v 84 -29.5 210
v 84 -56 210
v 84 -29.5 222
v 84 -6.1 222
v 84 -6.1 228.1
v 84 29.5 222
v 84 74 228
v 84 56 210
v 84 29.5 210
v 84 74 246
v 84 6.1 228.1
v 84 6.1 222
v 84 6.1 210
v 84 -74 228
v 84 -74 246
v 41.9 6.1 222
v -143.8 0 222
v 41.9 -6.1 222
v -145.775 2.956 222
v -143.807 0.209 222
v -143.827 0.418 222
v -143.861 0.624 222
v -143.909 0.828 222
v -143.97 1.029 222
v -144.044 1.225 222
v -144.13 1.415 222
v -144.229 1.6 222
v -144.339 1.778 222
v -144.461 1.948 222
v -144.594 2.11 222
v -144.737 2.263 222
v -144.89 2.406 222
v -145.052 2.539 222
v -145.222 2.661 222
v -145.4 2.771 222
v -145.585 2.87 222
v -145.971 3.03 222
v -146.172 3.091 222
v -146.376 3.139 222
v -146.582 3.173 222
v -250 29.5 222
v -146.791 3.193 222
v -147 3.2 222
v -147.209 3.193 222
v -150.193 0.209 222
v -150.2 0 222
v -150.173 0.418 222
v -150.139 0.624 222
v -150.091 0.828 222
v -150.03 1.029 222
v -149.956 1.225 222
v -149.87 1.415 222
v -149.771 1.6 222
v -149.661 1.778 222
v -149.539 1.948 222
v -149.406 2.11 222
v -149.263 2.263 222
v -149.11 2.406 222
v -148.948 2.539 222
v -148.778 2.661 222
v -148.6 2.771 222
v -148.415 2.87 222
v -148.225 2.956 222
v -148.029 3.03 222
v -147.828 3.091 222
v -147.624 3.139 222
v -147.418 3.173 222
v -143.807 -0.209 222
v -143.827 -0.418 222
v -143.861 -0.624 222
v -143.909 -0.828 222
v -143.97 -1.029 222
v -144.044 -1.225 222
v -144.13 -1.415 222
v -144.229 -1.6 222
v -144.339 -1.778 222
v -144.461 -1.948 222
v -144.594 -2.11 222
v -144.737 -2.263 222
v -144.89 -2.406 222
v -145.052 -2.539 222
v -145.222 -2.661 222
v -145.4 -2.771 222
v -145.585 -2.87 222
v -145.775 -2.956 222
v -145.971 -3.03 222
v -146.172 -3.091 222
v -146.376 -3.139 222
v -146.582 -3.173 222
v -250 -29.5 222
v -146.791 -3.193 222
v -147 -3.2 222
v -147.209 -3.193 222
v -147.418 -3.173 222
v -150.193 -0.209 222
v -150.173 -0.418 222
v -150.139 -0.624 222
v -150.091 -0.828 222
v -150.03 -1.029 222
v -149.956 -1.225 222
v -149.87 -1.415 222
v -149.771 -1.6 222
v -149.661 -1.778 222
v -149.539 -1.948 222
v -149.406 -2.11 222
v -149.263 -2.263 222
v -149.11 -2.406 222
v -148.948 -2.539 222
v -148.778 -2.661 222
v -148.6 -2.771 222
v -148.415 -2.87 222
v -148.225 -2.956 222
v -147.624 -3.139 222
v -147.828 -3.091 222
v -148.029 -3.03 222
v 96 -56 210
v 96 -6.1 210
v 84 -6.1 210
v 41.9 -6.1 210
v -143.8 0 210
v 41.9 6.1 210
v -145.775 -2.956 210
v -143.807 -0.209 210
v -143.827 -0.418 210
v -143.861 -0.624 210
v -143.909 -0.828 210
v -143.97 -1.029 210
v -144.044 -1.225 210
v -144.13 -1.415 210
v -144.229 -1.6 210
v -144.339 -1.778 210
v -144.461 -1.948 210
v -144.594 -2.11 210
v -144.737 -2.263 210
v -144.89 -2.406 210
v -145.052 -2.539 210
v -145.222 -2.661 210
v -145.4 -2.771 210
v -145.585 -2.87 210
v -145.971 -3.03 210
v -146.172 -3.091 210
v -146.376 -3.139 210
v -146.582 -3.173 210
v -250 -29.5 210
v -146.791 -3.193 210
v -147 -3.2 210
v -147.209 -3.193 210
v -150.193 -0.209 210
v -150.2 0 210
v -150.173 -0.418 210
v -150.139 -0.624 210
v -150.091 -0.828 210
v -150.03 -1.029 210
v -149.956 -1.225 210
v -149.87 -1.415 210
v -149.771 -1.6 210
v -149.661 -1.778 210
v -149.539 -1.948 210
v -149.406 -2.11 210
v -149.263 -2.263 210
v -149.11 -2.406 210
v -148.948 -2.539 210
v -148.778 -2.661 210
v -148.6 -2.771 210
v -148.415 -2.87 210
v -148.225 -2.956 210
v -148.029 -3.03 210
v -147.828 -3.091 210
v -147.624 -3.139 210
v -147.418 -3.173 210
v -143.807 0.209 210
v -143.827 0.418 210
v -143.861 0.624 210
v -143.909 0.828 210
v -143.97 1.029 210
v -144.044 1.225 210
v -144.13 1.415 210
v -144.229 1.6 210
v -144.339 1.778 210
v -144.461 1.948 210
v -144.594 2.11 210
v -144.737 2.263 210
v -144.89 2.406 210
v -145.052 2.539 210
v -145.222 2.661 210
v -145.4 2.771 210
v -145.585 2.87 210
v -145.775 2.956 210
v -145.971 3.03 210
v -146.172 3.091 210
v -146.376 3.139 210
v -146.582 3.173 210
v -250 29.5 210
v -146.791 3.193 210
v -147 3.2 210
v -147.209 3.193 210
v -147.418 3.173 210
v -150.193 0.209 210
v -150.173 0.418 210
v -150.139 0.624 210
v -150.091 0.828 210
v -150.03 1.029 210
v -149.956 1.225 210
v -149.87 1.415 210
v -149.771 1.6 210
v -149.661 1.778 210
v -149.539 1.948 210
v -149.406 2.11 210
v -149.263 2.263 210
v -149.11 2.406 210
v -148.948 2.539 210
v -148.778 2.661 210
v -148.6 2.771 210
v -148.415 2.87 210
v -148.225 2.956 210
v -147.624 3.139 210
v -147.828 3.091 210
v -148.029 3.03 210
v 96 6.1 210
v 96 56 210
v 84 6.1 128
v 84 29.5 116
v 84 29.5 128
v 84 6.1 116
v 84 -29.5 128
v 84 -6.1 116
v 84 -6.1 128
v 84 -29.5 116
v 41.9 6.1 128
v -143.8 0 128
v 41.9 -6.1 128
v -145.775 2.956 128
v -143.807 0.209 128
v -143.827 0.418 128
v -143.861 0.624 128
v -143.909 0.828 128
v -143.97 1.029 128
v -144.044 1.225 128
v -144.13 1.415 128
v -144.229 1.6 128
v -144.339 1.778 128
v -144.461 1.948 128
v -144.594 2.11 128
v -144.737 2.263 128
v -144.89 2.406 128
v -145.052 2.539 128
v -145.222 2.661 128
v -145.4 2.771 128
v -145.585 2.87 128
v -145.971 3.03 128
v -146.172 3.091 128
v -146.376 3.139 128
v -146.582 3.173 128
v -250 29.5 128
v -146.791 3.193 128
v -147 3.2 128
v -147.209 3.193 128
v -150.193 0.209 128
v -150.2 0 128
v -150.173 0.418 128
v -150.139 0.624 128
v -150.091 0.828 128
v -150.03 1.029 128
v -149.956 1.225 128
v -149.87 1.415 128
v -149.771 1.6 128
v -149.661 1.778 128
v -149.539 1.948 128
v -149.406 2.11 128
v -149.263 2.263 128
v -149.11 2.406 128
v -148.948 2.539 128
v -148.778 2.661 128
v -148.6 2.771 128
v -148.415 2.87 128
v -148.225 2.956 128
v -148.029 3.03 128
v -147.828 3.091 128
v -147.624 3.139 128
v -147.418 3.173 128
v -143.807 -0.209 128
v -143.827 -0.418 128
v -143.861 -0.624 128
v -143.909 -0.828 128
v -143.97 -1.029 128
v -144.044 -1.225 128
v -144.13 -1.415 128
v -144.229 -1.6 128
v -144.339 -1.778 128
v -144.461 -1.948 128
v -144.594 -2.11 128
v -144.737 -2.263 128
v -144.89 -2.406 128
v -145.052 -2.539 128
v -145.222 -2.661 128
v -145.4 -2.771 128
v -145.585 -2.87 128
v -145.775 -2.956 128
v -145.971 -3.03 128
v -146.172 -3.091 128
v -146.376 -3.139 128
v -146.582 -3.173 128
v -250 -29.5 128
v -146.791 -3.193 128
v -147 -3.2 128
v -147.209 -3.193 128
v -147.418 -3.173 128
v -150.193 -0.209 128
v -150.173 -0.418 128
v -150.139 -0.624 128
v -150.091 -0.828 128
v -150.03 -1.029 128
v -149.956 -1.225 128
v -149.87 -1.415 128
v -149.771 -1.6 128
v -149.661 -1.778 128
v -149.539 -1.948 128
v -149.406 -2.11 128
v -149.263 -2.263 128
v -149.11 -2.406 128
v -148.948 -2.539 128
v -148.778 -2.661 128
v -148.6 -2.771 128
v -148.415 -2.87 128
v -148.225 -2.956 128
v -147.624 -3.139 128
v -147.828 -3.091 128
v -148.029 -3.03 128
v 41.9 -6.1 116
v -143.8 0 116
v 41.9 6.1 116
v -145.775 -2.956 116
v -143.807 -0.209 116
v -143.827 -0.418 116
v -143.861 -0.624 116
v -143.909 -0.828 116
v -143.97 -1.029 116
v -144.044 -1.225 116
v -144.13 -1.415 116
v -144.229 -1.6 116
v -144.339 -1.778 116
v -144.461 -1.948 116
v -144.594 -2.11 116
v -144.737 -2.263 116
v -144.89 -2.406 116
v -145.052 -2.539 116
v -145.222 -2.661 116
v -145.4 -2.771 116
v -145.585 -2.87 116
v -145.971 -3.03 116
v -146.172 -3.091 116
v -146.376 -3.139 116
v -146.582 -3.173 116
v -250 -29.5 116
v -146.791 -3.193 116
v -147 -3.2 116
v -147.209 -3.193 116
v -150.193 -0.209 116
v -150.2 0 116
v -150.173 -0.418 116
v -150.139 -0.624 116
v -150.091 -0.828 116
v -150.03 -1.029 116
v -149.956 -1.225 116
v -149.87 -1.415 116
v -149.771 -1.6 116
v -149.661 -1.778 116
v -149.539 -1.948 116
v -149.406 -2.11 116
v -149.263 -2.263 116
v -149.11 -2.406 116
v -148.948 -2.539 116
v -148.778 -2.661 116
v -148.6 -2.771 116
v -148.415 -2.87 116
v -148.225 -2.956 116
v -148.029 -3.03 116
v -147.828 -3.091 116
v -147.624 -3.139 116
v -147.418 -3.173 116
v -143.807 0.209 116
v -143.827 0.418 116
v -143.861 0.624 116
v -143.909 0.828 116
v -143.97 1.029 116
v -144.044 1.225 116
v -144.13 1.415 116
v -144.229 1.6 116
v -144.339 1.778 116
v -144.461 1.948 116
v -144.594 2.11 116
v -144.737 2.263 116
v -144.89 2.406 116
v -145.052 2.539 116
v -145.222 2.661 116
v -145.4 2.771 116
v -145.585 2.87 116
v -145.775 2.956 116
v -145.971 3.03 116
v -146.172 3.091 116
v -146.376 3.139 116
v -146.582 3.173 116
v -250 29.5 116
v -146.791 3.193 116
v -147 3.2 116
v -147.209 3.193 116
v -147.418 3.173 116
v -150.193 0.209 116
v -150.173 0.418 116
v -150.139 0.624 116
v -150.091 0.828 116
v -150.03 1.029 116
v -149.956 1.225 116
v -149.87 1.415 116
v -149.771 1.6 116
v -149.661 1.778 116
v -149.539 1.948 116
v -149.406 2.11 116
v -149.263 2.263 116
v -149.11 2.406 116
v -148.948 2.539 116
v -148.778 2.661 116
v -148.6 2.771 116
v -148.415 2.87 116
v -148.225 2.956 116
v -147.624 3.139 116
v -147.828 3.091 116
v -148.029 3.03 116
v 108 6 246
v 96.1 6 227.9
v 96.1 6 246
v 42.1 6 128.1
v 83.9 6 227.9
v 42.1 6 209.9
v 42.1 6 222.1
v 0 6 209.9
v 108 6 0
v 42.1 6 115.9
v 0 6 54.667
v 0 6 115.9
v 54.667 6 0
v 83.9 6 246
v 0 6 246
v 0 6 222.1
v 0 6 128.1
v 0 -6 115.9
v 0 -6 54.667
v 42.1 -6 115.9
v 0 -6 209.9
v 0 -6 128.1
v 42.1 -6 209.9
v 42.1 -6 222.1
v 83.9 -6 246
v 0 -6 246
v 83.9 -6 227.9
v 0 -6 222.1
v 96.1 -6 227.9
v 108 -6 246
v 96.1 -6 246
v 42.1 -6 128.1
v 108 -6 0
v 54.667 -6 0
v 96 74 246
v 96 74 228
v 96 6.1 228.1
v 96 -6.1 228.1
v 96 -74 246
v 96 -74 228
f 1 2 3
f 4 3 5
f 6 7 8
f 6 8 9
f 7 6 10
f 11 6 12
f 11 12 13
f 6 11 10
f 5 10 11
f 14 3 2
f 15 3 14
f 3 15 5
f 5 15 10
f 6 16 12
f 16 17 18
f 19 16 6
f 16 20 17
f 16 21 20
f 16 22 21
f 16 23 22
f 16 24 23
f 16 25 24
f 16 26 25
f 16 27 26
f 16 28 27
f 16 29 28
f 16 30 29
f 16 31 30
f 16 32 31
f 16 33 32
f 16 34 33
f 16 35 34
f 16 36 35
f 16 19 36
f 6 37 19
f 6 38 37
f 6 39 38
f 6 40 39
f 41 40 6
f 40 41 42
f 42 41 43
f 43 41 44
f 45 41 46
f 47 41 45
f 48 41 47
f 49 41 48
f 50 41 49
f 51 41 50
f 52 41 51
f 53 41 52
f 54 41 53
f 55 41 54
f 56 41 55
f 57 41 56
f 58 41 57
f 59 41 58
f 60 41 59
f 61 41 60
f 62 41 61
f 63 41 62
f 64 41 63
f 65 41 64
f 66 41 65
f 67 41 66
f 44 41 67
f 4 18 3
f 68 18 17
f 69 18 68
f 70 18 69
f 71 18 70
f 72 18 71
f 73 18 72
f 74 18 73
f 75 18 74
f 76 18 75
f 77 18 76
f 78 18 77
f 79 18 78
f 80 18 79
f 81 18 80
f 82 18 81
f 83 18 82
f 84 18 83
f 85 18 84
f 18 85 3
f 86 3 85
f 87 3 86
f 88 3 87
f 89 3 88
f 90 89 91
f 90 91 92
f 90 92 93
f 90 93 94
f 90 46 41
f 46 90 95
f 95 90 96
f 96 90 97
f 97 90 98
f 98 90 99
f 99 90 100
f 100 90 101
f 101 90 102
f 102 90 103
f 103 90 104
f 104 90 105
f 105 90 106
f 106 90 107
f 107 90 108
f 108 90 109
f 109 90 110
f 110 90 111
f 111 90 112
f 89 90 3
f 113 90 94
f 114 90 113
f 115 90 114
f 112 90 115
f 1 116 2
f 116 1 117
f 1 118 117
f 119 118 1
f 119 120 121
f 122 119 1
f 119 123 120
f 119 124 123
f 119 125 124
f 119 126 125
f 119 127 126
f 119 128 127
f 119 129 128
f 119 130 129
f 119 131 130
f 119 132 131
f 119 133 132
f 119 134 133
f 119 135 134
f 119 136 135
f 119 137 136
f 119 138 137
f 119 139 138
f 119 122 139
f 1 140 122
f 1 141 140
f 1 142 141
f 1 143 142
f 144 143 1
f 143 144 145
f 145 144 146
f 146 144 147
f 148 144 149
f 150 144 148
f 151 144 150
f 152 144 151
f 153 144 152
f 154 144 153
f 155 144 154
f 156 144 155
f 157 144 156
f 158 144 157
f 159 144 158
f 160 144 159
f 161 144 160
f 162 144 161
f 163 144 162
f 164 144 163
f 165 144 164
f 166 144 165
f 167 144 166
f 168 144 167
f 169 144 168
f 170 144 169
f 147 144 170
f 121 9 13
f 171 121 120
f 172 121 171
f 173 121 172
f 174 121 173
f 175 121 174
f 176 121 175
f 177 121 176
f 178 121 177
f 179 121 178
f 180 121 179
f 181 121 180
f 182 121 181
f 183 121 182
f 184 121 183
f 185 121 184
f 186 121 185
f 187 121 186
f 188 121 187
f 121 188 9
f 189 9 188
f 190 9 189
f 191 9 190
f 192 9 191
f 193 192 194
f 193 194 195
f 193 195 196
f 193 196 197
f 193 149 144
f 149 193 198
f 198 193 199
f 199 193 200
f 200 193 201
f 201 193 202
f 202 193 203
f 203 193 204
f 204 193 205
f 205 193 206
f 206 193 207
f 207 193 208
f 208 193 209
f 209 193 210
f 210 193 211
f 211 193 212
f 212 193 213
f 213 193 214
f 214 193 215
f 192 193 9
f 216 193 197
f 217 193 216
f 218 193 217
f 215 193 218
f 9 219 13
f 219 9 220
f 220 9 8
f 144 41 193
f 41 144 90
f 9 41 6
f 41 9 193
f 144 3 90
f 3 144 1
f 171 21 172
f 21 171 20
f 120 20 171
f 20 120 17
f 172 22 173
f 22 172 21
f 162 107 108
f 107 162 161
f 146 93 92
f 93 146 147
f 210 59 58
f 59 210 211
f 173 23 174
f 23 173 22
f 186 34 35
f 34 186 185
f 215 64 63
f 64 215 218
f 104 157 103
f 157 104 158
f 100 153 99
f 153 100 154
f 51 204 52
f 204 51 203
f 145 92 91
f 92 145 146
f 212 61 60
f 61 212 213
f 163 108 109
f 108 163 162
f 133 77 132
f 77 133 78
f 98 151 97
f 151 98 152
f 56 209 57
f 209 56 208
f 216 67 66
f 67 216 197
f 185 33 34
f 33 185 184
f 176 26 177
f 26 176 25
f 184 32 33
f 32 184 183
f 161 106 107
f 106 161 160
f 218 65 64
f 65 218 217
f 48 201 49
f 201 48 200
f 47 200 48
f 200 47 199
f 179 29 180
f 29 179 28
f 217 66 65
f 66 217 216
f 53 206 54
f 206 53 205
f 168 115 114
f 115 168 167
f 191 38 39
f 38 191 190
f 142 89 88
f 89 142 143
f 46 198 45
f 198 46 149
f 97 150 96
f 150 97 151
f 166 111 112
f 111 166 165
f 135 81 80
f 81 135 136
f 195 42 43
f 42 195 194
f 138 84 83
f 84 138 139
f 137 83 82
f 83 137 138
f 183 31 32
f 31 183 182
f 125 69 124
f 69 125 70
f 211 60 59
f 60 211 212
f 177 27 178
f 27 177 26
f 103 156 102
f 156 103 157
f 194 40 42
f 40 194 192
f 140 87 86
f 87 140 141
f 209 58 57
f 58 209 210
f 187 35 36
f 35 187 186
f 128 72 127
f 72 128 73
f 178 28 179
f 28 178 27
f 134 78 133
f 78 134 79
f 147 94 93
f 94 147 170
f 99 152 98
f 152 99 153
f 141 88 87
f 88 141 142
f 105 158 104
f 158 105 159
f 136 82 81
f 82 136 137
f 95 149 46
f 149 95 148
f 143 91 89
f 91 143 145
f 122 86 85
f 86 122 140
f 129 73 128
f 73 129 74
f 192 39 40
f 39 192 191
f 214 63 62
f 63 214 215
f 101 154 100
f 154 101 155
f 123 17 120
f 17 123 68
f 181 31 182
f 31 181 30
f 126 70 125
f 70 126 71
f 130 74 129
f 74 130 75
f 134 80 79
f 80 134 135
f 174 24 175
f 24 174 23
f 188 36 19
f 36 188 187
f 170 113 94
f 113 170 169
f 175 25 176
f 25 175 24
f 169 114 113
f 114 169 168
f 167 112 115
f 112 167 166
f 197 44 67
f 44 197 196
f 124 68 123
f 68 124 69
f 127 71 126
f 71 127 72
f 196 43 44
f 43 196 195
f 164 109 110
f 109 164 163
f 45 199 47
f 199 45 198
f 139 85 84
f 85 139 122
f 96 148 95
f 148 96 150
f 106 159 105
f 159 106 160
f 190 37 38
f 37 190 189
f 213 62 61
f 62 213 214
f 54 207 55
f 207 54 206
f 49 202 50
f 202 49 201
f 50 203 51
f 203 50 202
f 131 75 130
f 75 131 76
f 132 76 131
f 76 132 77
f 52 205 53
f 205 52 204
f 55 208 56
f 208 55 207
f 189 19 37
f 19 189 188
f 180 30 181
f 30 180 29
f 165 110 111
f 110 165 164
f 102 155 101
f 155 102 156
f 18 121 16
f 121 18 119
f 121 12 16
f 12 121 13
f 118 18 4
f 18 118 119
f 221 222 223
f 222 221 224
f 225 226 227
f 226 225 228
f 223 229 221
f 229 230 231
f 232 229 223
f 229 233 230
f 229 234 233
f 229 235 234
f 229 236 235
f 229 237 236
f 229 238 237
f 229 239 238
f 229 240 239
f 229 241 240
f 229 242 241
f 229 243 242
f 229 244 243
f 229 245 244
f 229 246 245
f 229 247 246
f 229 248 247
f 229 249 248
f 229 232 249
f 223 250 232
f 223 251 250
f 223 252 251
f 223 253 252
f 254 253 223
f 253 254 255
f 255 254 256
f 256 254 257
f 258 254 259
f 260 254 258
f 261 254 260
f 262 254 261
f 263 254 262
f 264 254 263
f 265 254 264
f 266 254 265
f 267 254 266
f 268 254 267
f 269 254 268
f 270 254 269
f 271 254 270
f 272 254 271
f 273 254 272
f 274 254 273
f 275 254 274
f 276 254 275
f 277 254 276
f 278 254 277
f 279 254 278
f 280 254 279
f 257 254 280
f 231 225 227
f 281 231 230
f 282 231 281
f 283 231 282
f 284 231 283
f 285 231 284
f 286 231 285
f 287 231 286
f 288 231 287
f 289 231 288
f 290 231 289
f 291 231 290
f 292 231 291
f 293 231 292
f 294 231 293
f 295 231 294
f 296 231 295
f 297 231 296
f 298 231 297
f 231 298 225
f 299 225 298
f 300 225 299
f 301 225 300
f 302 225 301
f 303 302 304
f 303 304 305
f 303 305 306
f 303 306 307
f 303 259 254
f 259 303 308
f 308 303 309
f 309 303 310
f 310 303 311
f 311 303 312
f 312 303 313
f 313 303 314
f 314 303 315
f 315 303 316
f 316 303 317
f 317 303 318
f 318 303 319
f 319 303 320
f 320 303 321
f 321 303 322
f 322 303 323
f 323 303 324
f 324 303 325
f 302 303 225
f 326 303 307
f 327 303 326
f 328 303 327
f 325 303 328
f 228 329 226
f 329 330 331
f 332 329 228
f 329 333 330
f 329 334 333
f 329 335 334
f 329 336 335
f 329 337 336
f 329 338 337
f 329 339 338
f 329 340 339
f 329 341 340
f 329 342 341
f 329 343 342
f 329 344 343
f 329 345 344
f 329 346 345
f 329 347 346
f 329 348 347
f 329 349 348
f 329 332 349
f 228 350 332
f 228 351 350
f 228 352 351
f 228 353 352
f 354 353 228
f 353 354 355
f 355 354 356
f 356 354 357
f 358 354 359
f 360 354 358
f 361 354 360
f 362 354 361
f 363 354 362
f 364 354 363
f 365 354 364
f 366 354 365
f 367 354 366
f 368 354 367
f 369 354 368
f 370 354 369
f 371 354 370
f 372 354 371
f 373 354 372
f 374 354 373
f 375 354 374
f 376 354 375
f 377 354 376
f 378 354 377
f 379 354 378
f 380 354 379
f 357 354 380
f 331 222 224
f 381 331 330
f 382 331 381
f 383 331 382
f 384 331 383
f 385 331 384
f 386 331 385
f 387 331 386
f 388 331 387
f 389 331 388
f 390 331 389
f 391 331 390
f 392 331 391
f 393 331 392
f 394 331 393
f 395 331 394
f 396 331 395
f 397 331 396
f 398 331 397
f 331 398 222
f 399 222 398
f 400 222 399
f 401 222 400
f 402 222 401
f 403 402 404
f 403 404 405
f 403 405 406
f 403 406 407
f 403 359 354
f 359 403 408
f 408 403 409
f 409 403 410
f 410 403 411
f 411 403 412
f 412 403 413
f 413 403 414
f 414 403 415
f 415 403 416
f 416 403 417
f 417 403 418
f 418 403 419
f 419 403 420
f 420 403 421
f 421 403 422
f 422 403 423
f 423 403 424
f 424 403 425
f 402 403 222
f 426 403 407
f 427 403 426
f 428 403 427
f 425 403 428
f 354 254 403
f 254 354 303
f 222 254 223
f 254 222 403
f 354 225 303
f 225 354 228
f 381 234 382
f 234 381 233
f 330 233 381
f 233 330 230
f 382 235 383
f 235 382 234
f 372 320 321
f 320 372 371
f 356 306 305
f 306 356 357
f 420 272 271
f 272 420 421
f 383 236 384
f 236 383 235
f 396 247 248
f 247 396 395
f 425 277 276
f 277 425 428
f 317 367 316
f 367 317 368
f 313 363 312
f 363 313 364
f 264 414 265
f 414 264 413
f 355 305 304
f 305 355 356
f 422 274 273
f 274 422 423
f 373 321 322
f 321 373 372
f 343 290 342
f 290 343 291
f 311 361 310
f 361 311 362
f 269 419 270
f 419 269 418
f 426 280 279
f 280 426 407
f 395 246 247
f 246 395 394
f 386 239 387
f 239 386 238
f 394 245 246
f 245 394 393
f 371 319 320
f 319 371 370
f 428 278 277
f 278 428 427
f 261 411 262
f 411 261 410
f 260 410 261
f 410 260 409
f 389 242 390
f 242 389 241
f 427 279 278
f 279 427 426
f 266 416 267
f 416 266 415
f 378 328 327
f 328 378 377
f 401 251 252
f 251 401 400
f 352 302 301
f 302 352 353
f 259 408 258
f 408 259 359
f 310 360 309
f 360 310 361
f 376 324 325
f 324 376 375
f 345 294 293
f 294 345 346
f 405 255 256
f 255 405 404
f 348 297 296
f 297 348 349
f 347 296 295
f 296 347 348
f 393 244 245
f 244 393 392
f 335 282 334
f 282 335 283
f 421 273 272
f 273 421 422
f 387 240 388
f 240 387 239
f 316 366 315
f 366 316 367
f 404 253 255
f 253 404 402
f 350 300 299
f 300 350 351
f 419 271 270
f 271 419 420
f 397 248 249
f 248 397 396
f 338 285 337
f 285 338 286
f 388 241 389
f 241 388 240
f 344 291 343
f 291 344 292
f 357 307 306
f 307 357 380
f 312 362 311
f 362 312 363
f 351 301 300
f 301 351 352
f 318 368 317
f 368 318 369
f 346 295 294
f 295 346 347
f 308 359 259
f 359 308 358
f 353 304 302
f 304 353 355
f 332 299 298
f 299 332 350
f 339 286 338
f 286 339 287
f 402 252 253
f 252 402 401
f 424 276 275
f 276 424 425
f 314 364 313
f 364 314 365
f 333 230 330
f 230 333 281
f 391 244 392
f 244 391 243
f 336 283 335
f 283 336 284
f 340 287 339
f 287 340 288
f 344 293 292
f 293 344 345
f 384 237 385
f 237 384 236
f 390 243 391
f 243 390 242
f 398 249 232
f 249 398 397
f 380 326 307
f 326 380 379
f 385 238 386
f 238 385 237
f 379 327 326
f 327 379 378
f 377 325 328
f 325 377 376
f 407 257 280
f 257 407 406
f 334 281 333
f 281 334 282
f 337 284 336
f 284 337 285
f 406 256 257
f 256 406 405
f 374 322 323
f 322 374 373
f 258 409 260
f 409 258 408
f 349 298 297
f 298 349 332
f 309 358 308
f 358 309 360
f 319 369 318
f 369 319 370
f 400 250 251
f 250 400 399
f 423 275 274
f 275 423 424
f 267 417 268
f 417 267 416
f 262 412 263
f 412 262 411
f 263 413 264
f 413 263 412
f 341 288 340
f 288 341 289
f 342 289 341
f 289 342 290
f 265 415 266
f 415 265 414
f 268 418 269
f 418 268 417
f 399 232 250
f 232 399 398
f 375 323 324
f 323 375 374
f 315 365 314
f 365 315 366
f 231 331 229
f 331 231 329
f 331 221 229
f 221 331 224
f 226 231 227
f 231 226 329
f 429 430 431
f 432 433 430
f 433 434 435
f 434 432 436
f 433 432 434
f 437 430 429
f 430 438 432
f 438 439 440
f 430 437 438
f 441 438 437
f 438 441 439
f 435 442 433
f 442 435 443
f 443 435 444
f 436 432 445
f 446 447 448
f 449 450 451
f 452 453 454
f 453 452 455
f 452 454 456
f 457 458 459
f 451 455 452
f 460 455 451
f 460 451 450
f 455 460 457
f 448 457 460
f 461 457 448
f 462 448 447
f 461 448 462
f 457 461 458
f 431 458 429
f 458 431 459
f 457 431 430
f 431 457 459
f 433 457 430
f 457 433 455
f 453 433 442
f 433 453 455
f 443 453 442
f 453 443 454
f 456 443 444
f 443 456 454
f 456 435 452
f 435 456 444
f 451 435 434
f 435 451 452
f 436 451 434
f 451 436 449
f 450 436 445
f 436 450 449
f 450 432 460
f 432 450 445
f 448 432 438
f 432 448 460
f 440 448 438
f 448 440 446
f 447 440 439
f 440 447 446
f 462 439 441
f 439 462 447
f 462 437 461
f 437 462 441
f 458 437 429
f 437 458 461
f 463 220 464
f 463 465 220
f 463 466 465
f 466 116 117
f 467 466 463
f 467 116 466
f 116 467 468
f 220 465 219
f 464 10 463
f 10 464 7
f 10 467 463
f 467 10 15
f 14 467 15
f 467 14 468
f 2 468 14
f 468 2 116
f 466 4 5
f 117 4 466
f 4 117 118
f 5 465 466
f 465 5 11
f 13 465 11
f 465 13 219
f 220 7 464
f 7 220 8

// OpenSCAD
// ==========================================================================
//  GENERATED FILE -- DO NOT EDIT.
//  Produced by build/build.py from components/Turtle_Rear_Fin_v1.scad
//  Turtle Body version 1.8.1
//  Edit lib/ and src/ instead, then run: python3 build/build.py
// ==========================================================================
/*
 Hope Turtle rear fin. Units: mm. License: CERN-OHL-S-2.0.
 Four wooden pieces: yellow fin, two green bottle-holder shafts, red solar
 crossbar. Panel + bottle are F5 reference only, excluded from F6/STL.
 Shaft length 334. Slot openings 12.2 mm (0.2 mm TOTAL, centred).
 TB-07: green-slat mounting hole is 103 mm from the shaft front, matching
 the assembled Turtle (was a fixed 50 mm).

 SOURCE FILE — geometry lives in lib/rear_fin.scad + lib/params.scad.
 The committed self-contained file is generated by build/build.py.
*/

/* [Fit and tuning] */
half_lap_clearance   = 0.2; // TOTAL extra slot width, centred on the board
solar_slot_clearance = 0.2;
exploded = 0;

/* [Display] */
part = "assembly"; // [assembly,fin,solar_holder,shaft]
show_solar_panel = true;   // F5 reference only, excluded from F6/STL
show_bottle_mockup = false; // reserved

/* [Render] */
fn = 96;

// [bundle] begin use <../../lib/rear_fin.scad>
// ==========================================================================
//  Turtle Body -- rear fin + solar-panel support  (lib module)
// --------------------------------------------------------------------------
//  One yellow vertical fin, two green bottle-holder shafts, one red solar
//  crossbar. In the standalone the panel + bottle are %-reference only and
//  excluded from F6/STL. See CLAUDE.md s11.
//
//  Shaft length keeps the approved formula 305 + (2/3)(93-24) - 17 = 334.
//  Half-lap and solar-joint clearances are 0.2 mm TOTAL, centred on the
//  12 mm board (slot opening 12.2 mm, not 12.4). TB-07: the green-slat
//  mounting hole is p_rear_shaft_hole_from_front() (103 mm at defaults),
//  matching the assembled Turtle -- not the old fixed 50 mm.
//
//  Definitions only. Geometry is emitted by rear_fin_assembly() or the
//  individual part modules.
// ==========================================================================

// [bundle] begin use <params.scad>
// ==========================================================================
//  Turtle Body -- shared dimension contract
// --------------------------------------------------------------------------
//  The single source of truth for every dimension that more than one
//  subsystem depends on. Values are exposed as zero-argument functions so
//  this file can be pulled in with `use <params.scad>` (which ignores
//  top-level variable assignments) without polluting any namespace.
//
//  lib/ modules take these as DEFAULT argument values:
//      module control_cap(roof_t = p_cap_roof_t(), ...) { ... }
//  so a src/ wrapper can still override one value from its customizer block
//  while every other subsystem keeps the shared number.
//
//  Rules:
//   * one function per concept, canonical name (see CLAUDE.md cross-file table)
//   * derived values are functions of other p_*() functions, never re-typed
//   * mm throughout; names say _d (diameter), _r (radius), _t (thickness),
//     _len / _h (axial), _af (hex across-flats)
//   * do NOT add a bare `x = ...;` here -- bundle.py / lint.py will reject it
// ==========================================================================

// ---- tolerances and render quality --------------------------------------
function p_eps()          = 0.02;   // Boolean overlap / cut-through fudge
function p_fit_clearance() = 0.2;   // wood joint: TOTAL extra slot width, centred on the board
function p_fn_plastic()   = 120;    // printed PLA parts (cap, cage, axle, mold)
function p_fn_wood()      = 96;     // cut wooden parts
function p_fn_curve()     = 180;    // fine profile curves (bottle, sails)

// ---- bottle (the foundation reference) ---------------------------------
function p_bottle_d()        = 82;    // outside diameter
function p_bottle_h()        = 305;   // total height incl. ordinary screw cap
function p_bottle_wall_t()   = 0.5;   // modelling assumption, not a measurement
function p_bottle_cap_d()    = 31;    // ordinary screw cap (NOT the control-cap disk)
function p_bottle_cap_h()    = 17;    // ordinary screw cap height (rear-fin / ballast formulas)
function p_collar_d()        = 34;    // bottle collar, independent of cap diameter
function p_top_dome_h()      = 62;
function p_bottom_dome_h()   = 25;
function p_dome_power()      = 2.5;   // superellipse exponent
function p_bottle_neck_h()   = 5;
function p_bottle_collar_h() = 1;
function p_bottle_neck_d()   = p_bottle_cap_d() - 3;   // 28: neck is 3 mm under the cap
function p_bottle_base_ratio() = 0.88; // slightly narrower footprint at the base
function p_bottle_profile_steps() = 16;
// cut bottle (control head): the lower dome is removed and a short socket is
// bored so the control-cap insert slides in. Cut plane sits 5 mm above the
// bottom dome height.
function p_bottle_cut_extra()  = 5;
function p_bottle_cut_height() = p_bottom_dome_h() + p_bottle_cut_extra();   // 30

// nominal bottle interior and the cap insert that enters it
function p_bottle_socket_d() = p_bottle_d() - 2 * p_bottle_wall_t();          // 81
function p_insert_shaft_radial_clearance() = 1;
function p_insert_shaft_d()  = p_bottle_socket_d()
                             - 2 * p_insert_shaft_radial_clearance();          // 79

// ---- wooden stock -----------------------------------------------------
function p_wood_t()          = 12;    // shared board / slat thickness
function p_fin_board_w()     = 93;    // shared fin-system stock width
function p_screw_side_offset() = 25;  // mounting-hole inset from a John end

// ---- Ecojoiner port --------------------------------------------------
// A port must swallow the bottle's tapered top (the top dome) plus a seating
// allowance, so its axial length is DERIVED from the bottle, not fixed. This
// is the same rule the HopeTurtles.org generators use
// (port_length = taper_height + port_allowance); until 2026-09-08 lib carried
// the evaluated constant 82 instead, which silently broke the rule for any
// bottle other than the reference one. Ballast and Ecojoiner both read it.
function p_port_allowance()  = 20;                 // seating allowance beyond the dome
function p_port_length()     = p_top_dome_h() + p_port_allowance();   // 62 + 20 = 82
function p_port_height()     = p_bottle_d();       // opening height == bottle diameter (asserted)

// ---- M6 hardware ---------------------------------------------------
function p_m6_clearance_d()  = 6.4;   // M6 clearance hole
function p_m6_bolt_shaft_d() = 6;     // visual placeholder only
function p_m6_bolt_head_d()  = 12;
function p_m6_bolt_head_t()  = 4;

// ---- control cap (large stationary disk; see CLAUDE.md s7) ----------
//  TB-03 resolution: repository 5 mm roof / 2 mm boss is authoritative;
//  the axle (below) is derived to this datum.
function p_cap_disk_d()      = 100;   // control-cap disk (independent of p_bottle_cap_d)
function p_cap_roof_t()      = 5;     // disk / roof thickness
function p_cap_boss_depth()  = 2;     // extra projection of the centre boss into the hollow cap
function p_cap_boss_d()      = 18;
function p_cap_insert_len()  = 35;    // straight insert shaft length
function p_cap_insert_wall_t() = 4;
function p_cap_entry_chamfer_h()     = 1;
function p_cap_entry_chamfer_delta() = 1;
function p_cap_axle_bore_d() = 8.6;   // 0.3 mm radial clearance to the Ø8 shaft
function p_cap_cage_radial_clearance() = 1;   // cap disk -> cage inner wall (radial)
function p_cap_total_h()     = p_cap_roof_t() + p_cap_insert_len();           // 40
function p_cap_bearing_len() = p_cap_roof_t() + p_cap_boss_depth();           // 7

// buttons (through both cap and cage)
function p_button_upper_d()  = 17;    // clearance hole in the cap
function p_button_axis()     = "y";   // "x" or "y"
function p_button_radius()   = 24;    // radial position of the two button centres (48 mm apart)

// ---- silicone seal grooves + rings (CLAUDE.md s8) ------------------
function p_seal_groove_count()      = 2;
function p_seal_groove_axial_h()    = 2;   // groove height
function p_seal_groove_radial_depth() = 2; // groove depth
function p_seal_groove1_from_shoulder() = 12;  // groove centre, measured from the insert SHOULDER
function p_seal_groove2_from_shoulder() = 25;
function p_seal_ring_axial_t()      = 1.5;  // cast ring thickness
function p_seal_ring_radial_w()     = 5;    // NOT validated; 3.5 was a suggested milder prototype
function p_seal_groove_root_d() = p_insert_shaft_d()
                                - 2 * p_seal_groove_radial_depth();            // 75

// ---- round / hex centre axle (CLAUDE.md s9) -----------------------
//  Derived to the 5/2 cap datum (TB-03/TB-04). round_inside_cap is measured
//  from the roof underside and INCLUDES the boss -- do not add the boss again.
function p_axle_round_d()        = 8;
function p_axle_round_ext()      = 1;    // projection above the cap's outer face
function p_axle_round_inside_cap() = p_cap_insert_len() - 5;  // 30: roof underside to round end (incl. boss)
function p_axle_round_len()      = p_axle_round_inside_cap() + p_cap_roof_t() + p_axle_round_ext();  // 36
function p_axle_hex_af()         = 10.0; // shaft across-flats (0.3 mm to the Ø10.3 cage bore)
function p_axle_hex_len()        = 23;
function p_axle_join_overlap()   = 0.2;  // hex<->round Boolean overlap
function p_axle_total_len()      = p_axle_hex_len() + p_axle_round_len();
function p_axle_hex_corner_d()   = p_axle_hex_af() / cos(30);                  // ~11.55
function p_magnet_d()            = 3;    // AS5600 sensing magnet recess
function p_magnet_t()            = 1;

// ---- axle rotary shaft O-ring (waterproofs the axle bore; cast in the mold) ----
//  A round-section O-ring seated in a gland in the control-cap bore, sealing
//  against the spinning round section of the axle. ID is tied to the shaft.
function p_axle_oring_cs()     = 2.0;                                   // cross-section
function p_axle_oring_id()     = p_axle_round_d();                      // 8 -- hugs the shaft
function p_axle_oring_od()     = p_axle_oring_id() + 2 * p_axle_oring_cs();          // 12
function p_axle_oring_mean_r() = (p_axle_oring_id() + p_axle_oring_cs()) / 2;        // 5
//  gland cut into the cap bore for it
function p_cap_oring_squeeze()      = 0.25;  // radial squeeze on the seal
function p_cap_oring_gland_od()     = p_axle_oring_od() - 2 * p_cap_oring_squeeze(); // 11.5
function p_cap_oring_gland_w()      = 1.3 * p_axle_oring_cs();                       // 2.6 axial
function p_cap_oring_gland_from_face() = 3.5; // gland centre, from the cap outer face, along the bore

// ---- rotating control cage (CLAUDE.md s6) ------------------------
function p_cage_wall_t()     = 6.5;   // radial wall thickness
function p_cage_roof_t()     = 6;     // roof / surface plate thickness
function p_cage_inner_d()    = p_cap_disk_d() + 2 * p_cap_cage_radial_clearance();   // 102
function p_cage_outer_d()    = p_cage_inner_d() + 2 * p_cage_wall_t();               // 115
function p_cage_skirt_depth()   = 44;   // roof underside to the ORIGINAL skirt rim
function p_cage_peak_extension() = 20;  // crest extends this far past the original rim
function p_cage_valley_wall_h()  = 10;  // minimum wall depth between mounts
function p_cage_total_h()    = p_cage_skirt_depth() + p_cage_roof_t();              // 50 (native)
function p_cage_notch_count()   = 4;
function p_cage_notch_w()    = 22.5;  // batten groove width
function p_cage_notch_depth() = 3.7;
function p_cage_wave_segments() = 240;
function p_cage_hub_d()      = 29;
function p_cage_pocket_d()   = 26;    // top clip pocket
function p_cage_pocket_depth() = 4;
function p_cage_hex_bore_af() = 10.3; // central hex bore (0.3 mm to the Ø10.0 shaft)
function p_cage_bearing_d()  = 9;     // hemispherical bearing bump
function p_cage_bearing_count() = 8;
function p_cage_bearing_pcd() = p_cap_disk_d() - p_cage_bearing_d() + 0.5;          // 91.5
function p_cage_top_hole_d() = 18;    // central button / access hole through the roof
function p_cage_mount_hole_d() = 3.2; // two M3 clearance holes per batten / groove
function p_cage_mount_pitch()  = 32;  // vertical pitch of the pair
function p_cage_lower_hole_from_tip() = 10;
// 45-deg outward chamfer on the roof-top outer edge (0 = sharp). The cage
// prints roof-face-down, so this bevel flares OUT from the bed and stays
// printable; it is masked away around each batten groove. See lib/control_cage.scad.
function p_cage_roof_bevel() = 4;

// ---- sail apparatus (CLAUDE.md s10) ---------------------------
function p_side_batten_h()   = 205;
function p_side_batten_w()   = 20;
function p_side_batten_radial_t() = 10;
function p_top_crossbar_len() = 6 * p_bottle_d();   // 492
function p_top_crossbar_w()  = 22;
function p_top_crossbar_t()  = p_wood_t();          // 12
function p_sail_bar_axle_hole_d() = 12;             // Ø12; fits the ~11.55 hex corner dia
function p_bottom_rail_len() = 3 * p_bottle_d();    // 246
function p_bottom_rail_bottle_clearance() = 1;
function p_sail_rail_color()  = [0.56, 0.39, 0.39]; // brown (top AND bottom rails)
function p_c_piece_color()    = [1.0, 0.52, 0.20];  // orange, retained

// ---- rear fin + solar support (CLAUDE.md s11) ----------------
function p_solar_panel_w() = 148;
function p_solar_panel_h() = 223;
function p_solar_panel_t() = 2.5;    // real panel, independent of wood thickness
function p_rear_shaft_len() = p_bottle_h()
                            + (2/3) * (p_fin_board_w() - 2 * p_wood_t())
                            - p_bottle_cap_h();                                 // 334
function p_rear_half_lap_engagement() = 42;   // green/yellow interlock depth
function p_rear_fin_tab_width() = 15;
function p_rear_shaft_width()   = 59;
// TB-07: the green-slat mounting hole follows the mating Ecojoiner John, not a
// fixed 50 mm. Derived from the install transform; the john_length/2 terms
// cancel, leaving a pure function of the shared contract (= 103 at defaults).
function p_rear_shaft_hole_from_front() =
    p_rear_shaft_len() - p_screw_side_offset() - p_bottle_h()
    + p_bottle_cap_h() + p_port_height();

// ---- ballast attachment (CLAUDE.md s12) ---------------------
function p_ballast_core_w()   = p_bottle_d() - 2 * p_wood_t();                  // 58
function p_ballast_core_len() = p_bottle_h() - p_bottle_cap_h() + 6 * p_wood_t();  // 360
function p_ballast_slat_gap() = p_bottle_d();          // clear inner-face gap
function p_ballast_slat_spacing() = p_bottle_d() + p_wood_t();                  // 94
function p_ballast_board_len() = 3.5 * p_bottle_d();   // 287
function p_ballast_fin_len()   = 3 * p_bottle_d();     // 246
function p_ballast_lock_w()    = 5 * p_wood_t();       // 60
// [bundle] end   <params.scad>

function rf_t()             = p_wood_t();
function rf_fin_width()     = p_fin_board_w() + p_rear_fin_tab_width();          // 108
function rf_fin_height()    = 3 * p_bottle_d();                                  // 246
function rf_diag()          = (2/3) * p_bottle_d();                              // 54.667
function rf_shaft_length()  = p_rear_shaft_len();                               // 334
function rf_shaft_width()   = p_rear_shaft_width();                             // 59
function rf_solar_holder_len() = p_solar_panel_w();                            // 148
function rf_solar_holder_h()   = 3 * rf_t();                                    // 36
function rf_solar_chamfer()    = 1.5 * rf_t();                                  // 18
function rf_solar_slot_depth() = rf_solar_holder_h() / 2;                       // 18
function rf_solar_notch_x0()   = rf_fin_width() - 2 * rf_t();                    // 84
function rf_shaft_rear_x()     = rf_solar_notch_x0();                            // 84
function rf_shaft_front_x()    = rf_shaft_rear_x() - rf_shaft_length();
function rf_joint_meet_x()     = rf_shaft_rear_x() / 2;
function rf_upper_shaft_z0()   = rf_fin_height() - 3 * rf_t();
function rf_lower_shaft_z0()   = rf_upper_shaft_z0() - p_bottle_d() - rf_t();
function rf_solar_meet_z()     = rf_upper_shaft_z0() + rf_solar_slot_depth();

module rf_assert_valid(half_lap, solar_clear, hole_from_front, hole_d) {
    t = rf_t();
    assert(t > 0 && p_bottle_h() > p_bottle_cap_h() && p_bottle_cap_d() > 0);
    assert(p_bottle_d() > 0 && p_fin_board_w() > 2 * t && p_rear_fin_tab_width() > 0);
    assert(p_solar_panel_w() > 0 && p_solar_panel_h() > 0 && p_solar_panel_t() > 0);
    assert(half_lap >= 0 && solar_clear >= 0);
    assert(rf_shaft_front_x() < 0 && rf_joint_meet_x() > half_lap / 2);
    assert(rf_shaft_width() > t + half_lap);
    assert(half_lap < t && half_lap < p_bottle_d());
    assert(rf_lower_shaft_z0() - half_lap / 2 >= rf_diag(),
           "rear_fin: lower joint intersects the diagonal fin edge.");
    assert(rf_fin_width() > rf_diag());
    assert(solar_clear < t && rf_solar_notch_x0() > solar_clear / 2);
    assert(2 * rf_solar_chamfer() + t + solar_clear < rf_solar_holder_len(),
           "rear_fin: panel width leaves too little red-board material beside the slot.");
    assert(hole_d > 0 && rf_shaft_width() > hole_d);
    assert(hole_from_front > hole_d / 2
           && rf_shaft_front_x() + hole_from_front + hole_d / 2 < 0,
           "rear_fin: shaft hole must stay in the forward, unjointed portion.");
}

module rear_fin(half_lap = p_fit_clearance(), solar_clear = p_fit_clearance(),
                fn = undef) {
    t = rf_t(); eps = p_eps();
    nn = fn == undef ? p_fn_wood() : fn;
    color([1, 0.72, 0.05]) rotate([90, 0, 0])
        linear_extrude(height = t, center = true, $fn = nn) difference() {
            polygon([[0, rf_diag()], [rf_diag(), 0],
                     [rf_fin_width(), 0], [rf_fin_width(), rf_fin_height()],
                     [0, rf_fin_height()]]);
            for (z = [rf_upper_shaft_z0(), rf_lower_shaft_z0()])
                translate([-eps, z - half_lap / 2])
                    square([rf_joint_meet_x() + half_lap / 2 + eps, t + half_lap]);
            translate([rf_solar_notch_x0() - solar_clear / 2,
                       rf_solar_meet_z() - solar_clear / 2])
                square([t + solar_clear,
                        rf_fin_height() - rf_solar_meet_z() + solar_clear / 2 + eps]);
        }
}

module bottle_holder_shaft(z0 = 0, half_lap = p_fit_clearance(),
                           hole_from_front = undef, hole_d = undef, fn = undef) {
    t = rf_t(); eps = p_eps();
    nn  = fn == undef ? p_fn_wood() : fn;
    hff = hole_from_front == undef ? p_rear_shaft_hole_from_front() : hole_from_front;
    hd  = hole_d == undef ? p_m6_clearance_d() : hole_d;
    color([0.2, 0.38, 0.05]) difference() {
        translate([rf_shaft_front_x(), -rf_shaft_width() / 2, z0])
            cube([rf_shaft_length(), rf_shaft_width(), t]);
        translate([rf_shaft_front_x() + hff, 0, z0 - eps])
            cylinder(d = hd, h = t + 2 * eps, $fn = nn);
        translate([rf_joint_meet_x() - half_lap / 2, -(t + half_lap) / 2, z0 - eps])
            cube([rf_shaft_rear_x() - rf_joint_meet_x() + half_lap / 2 + eps,
                  t + half_lap, t + 2 * eps]);
    }
}

module solar_panel_holder(solar_clear = p_fit_clearance(), fn = undef) {
    t = rf_t(); eps = p_eps();
    nn = fn == undef ? p_fn_wood() : fn;
    L = rf_solar_holder_len(); H = rf_solar_holder_h(); ch = rf_solar_chamfer();
    color("red") translate([rf_solar_notch_x0(), 0, rf_upper_shaft_z0()])
        rotate([90, 0, 90]) translate([-L / 2, 0, 0])
            linear_extrude(height = t, $fn = nn) difference() {
                square([L, H]);
                polygon([[0, 0], [ch, 0], [0, ch]]);
                polygon([[L, 0], [L - ch, 0], [L, ch]]);
                translate([(L - t - solar_clear) / 2, -eps])
                    square([t + solar_clear, rf_solar_slot_depth() + solar_clear / 2 + eps]);
            }
}

module rear_fin_assembly(half_lap = p_fit_clearance(), solar_clear = p_fit_clearance(),
                         exploded = 0, fn = undef) {
    rf_assert_valid(half_lap, solar_clear,
                    p_rear_shaft_hole_from_front(), p_m6_clearance_d());
    rear_fin(half_lap, solar_clear, fn);
    translate([-exploded, 0,  exploded]) bottle_holder_shaft(rf_upper_shaft_z0(), half_lap, fn = fn);
    translate([-exploded, 0, -exploded]) bottle_holder_shaft(rf_lower_shaft_z0(), half_lap, fn = fn);
    translate([ exploded, 0,  exploded]) solar_panel_holder(solar_clear, fn);

    echo("REAR FIN: shaft length = ", rf_shaft_length(),
         " | hole from front (TB-07) = ", p_rear_shaft_hole_from_front(),
         " | slot opening = ", rf_t() + half_lap);
}
// [bundle] end   <../../lib/rear_fin.scad>
// [bundle] begin use <../../lib/params.scad>
// [bundle] already inlined: params.scad
// [bundle] end   <../../lib/params.scad>

module _panel_reference() {
    // width -> Y, height/length -> X, thickness -> Z; extends forward from the crossbar
    x0 = rf_solar_notch_x0() + p_wood_t() - p_solar_panel_h();
    color([0.05, 0.16, 0.4, 0.65])
        translate([x0, -p_solar_panel_w() / 2, rf_fin_height()])
            cube([p_solar_panel_h(), p_solar_panel_w(), p_solar_panel_t()]);
}

if (part == "assembly") {
    rear_fin_assembly(half_lap = half_lap_clearance,
                      solar_clear = solar_slot_clearance,
                      exploded = exploded, fn = fn);
    if (show_solar_panel && exploded == 0) %_panel_reference();
} else if (part == "fin") {
    rear_fin(half_lap = half_lap_clearance, solar_clear = solar_slot_clearance, fn = fn);
} else if (part == "solar_holder") {
    solar_panel_holder(solar_clear = solar_slot_clearance, fn = fn);
} else if (part == "shaft") {
    bottle_holder_shaft(half_lap = half_lap_clearance, fn = fn);
} else {
    assert(false, str("Unknown part: ", part));
}
